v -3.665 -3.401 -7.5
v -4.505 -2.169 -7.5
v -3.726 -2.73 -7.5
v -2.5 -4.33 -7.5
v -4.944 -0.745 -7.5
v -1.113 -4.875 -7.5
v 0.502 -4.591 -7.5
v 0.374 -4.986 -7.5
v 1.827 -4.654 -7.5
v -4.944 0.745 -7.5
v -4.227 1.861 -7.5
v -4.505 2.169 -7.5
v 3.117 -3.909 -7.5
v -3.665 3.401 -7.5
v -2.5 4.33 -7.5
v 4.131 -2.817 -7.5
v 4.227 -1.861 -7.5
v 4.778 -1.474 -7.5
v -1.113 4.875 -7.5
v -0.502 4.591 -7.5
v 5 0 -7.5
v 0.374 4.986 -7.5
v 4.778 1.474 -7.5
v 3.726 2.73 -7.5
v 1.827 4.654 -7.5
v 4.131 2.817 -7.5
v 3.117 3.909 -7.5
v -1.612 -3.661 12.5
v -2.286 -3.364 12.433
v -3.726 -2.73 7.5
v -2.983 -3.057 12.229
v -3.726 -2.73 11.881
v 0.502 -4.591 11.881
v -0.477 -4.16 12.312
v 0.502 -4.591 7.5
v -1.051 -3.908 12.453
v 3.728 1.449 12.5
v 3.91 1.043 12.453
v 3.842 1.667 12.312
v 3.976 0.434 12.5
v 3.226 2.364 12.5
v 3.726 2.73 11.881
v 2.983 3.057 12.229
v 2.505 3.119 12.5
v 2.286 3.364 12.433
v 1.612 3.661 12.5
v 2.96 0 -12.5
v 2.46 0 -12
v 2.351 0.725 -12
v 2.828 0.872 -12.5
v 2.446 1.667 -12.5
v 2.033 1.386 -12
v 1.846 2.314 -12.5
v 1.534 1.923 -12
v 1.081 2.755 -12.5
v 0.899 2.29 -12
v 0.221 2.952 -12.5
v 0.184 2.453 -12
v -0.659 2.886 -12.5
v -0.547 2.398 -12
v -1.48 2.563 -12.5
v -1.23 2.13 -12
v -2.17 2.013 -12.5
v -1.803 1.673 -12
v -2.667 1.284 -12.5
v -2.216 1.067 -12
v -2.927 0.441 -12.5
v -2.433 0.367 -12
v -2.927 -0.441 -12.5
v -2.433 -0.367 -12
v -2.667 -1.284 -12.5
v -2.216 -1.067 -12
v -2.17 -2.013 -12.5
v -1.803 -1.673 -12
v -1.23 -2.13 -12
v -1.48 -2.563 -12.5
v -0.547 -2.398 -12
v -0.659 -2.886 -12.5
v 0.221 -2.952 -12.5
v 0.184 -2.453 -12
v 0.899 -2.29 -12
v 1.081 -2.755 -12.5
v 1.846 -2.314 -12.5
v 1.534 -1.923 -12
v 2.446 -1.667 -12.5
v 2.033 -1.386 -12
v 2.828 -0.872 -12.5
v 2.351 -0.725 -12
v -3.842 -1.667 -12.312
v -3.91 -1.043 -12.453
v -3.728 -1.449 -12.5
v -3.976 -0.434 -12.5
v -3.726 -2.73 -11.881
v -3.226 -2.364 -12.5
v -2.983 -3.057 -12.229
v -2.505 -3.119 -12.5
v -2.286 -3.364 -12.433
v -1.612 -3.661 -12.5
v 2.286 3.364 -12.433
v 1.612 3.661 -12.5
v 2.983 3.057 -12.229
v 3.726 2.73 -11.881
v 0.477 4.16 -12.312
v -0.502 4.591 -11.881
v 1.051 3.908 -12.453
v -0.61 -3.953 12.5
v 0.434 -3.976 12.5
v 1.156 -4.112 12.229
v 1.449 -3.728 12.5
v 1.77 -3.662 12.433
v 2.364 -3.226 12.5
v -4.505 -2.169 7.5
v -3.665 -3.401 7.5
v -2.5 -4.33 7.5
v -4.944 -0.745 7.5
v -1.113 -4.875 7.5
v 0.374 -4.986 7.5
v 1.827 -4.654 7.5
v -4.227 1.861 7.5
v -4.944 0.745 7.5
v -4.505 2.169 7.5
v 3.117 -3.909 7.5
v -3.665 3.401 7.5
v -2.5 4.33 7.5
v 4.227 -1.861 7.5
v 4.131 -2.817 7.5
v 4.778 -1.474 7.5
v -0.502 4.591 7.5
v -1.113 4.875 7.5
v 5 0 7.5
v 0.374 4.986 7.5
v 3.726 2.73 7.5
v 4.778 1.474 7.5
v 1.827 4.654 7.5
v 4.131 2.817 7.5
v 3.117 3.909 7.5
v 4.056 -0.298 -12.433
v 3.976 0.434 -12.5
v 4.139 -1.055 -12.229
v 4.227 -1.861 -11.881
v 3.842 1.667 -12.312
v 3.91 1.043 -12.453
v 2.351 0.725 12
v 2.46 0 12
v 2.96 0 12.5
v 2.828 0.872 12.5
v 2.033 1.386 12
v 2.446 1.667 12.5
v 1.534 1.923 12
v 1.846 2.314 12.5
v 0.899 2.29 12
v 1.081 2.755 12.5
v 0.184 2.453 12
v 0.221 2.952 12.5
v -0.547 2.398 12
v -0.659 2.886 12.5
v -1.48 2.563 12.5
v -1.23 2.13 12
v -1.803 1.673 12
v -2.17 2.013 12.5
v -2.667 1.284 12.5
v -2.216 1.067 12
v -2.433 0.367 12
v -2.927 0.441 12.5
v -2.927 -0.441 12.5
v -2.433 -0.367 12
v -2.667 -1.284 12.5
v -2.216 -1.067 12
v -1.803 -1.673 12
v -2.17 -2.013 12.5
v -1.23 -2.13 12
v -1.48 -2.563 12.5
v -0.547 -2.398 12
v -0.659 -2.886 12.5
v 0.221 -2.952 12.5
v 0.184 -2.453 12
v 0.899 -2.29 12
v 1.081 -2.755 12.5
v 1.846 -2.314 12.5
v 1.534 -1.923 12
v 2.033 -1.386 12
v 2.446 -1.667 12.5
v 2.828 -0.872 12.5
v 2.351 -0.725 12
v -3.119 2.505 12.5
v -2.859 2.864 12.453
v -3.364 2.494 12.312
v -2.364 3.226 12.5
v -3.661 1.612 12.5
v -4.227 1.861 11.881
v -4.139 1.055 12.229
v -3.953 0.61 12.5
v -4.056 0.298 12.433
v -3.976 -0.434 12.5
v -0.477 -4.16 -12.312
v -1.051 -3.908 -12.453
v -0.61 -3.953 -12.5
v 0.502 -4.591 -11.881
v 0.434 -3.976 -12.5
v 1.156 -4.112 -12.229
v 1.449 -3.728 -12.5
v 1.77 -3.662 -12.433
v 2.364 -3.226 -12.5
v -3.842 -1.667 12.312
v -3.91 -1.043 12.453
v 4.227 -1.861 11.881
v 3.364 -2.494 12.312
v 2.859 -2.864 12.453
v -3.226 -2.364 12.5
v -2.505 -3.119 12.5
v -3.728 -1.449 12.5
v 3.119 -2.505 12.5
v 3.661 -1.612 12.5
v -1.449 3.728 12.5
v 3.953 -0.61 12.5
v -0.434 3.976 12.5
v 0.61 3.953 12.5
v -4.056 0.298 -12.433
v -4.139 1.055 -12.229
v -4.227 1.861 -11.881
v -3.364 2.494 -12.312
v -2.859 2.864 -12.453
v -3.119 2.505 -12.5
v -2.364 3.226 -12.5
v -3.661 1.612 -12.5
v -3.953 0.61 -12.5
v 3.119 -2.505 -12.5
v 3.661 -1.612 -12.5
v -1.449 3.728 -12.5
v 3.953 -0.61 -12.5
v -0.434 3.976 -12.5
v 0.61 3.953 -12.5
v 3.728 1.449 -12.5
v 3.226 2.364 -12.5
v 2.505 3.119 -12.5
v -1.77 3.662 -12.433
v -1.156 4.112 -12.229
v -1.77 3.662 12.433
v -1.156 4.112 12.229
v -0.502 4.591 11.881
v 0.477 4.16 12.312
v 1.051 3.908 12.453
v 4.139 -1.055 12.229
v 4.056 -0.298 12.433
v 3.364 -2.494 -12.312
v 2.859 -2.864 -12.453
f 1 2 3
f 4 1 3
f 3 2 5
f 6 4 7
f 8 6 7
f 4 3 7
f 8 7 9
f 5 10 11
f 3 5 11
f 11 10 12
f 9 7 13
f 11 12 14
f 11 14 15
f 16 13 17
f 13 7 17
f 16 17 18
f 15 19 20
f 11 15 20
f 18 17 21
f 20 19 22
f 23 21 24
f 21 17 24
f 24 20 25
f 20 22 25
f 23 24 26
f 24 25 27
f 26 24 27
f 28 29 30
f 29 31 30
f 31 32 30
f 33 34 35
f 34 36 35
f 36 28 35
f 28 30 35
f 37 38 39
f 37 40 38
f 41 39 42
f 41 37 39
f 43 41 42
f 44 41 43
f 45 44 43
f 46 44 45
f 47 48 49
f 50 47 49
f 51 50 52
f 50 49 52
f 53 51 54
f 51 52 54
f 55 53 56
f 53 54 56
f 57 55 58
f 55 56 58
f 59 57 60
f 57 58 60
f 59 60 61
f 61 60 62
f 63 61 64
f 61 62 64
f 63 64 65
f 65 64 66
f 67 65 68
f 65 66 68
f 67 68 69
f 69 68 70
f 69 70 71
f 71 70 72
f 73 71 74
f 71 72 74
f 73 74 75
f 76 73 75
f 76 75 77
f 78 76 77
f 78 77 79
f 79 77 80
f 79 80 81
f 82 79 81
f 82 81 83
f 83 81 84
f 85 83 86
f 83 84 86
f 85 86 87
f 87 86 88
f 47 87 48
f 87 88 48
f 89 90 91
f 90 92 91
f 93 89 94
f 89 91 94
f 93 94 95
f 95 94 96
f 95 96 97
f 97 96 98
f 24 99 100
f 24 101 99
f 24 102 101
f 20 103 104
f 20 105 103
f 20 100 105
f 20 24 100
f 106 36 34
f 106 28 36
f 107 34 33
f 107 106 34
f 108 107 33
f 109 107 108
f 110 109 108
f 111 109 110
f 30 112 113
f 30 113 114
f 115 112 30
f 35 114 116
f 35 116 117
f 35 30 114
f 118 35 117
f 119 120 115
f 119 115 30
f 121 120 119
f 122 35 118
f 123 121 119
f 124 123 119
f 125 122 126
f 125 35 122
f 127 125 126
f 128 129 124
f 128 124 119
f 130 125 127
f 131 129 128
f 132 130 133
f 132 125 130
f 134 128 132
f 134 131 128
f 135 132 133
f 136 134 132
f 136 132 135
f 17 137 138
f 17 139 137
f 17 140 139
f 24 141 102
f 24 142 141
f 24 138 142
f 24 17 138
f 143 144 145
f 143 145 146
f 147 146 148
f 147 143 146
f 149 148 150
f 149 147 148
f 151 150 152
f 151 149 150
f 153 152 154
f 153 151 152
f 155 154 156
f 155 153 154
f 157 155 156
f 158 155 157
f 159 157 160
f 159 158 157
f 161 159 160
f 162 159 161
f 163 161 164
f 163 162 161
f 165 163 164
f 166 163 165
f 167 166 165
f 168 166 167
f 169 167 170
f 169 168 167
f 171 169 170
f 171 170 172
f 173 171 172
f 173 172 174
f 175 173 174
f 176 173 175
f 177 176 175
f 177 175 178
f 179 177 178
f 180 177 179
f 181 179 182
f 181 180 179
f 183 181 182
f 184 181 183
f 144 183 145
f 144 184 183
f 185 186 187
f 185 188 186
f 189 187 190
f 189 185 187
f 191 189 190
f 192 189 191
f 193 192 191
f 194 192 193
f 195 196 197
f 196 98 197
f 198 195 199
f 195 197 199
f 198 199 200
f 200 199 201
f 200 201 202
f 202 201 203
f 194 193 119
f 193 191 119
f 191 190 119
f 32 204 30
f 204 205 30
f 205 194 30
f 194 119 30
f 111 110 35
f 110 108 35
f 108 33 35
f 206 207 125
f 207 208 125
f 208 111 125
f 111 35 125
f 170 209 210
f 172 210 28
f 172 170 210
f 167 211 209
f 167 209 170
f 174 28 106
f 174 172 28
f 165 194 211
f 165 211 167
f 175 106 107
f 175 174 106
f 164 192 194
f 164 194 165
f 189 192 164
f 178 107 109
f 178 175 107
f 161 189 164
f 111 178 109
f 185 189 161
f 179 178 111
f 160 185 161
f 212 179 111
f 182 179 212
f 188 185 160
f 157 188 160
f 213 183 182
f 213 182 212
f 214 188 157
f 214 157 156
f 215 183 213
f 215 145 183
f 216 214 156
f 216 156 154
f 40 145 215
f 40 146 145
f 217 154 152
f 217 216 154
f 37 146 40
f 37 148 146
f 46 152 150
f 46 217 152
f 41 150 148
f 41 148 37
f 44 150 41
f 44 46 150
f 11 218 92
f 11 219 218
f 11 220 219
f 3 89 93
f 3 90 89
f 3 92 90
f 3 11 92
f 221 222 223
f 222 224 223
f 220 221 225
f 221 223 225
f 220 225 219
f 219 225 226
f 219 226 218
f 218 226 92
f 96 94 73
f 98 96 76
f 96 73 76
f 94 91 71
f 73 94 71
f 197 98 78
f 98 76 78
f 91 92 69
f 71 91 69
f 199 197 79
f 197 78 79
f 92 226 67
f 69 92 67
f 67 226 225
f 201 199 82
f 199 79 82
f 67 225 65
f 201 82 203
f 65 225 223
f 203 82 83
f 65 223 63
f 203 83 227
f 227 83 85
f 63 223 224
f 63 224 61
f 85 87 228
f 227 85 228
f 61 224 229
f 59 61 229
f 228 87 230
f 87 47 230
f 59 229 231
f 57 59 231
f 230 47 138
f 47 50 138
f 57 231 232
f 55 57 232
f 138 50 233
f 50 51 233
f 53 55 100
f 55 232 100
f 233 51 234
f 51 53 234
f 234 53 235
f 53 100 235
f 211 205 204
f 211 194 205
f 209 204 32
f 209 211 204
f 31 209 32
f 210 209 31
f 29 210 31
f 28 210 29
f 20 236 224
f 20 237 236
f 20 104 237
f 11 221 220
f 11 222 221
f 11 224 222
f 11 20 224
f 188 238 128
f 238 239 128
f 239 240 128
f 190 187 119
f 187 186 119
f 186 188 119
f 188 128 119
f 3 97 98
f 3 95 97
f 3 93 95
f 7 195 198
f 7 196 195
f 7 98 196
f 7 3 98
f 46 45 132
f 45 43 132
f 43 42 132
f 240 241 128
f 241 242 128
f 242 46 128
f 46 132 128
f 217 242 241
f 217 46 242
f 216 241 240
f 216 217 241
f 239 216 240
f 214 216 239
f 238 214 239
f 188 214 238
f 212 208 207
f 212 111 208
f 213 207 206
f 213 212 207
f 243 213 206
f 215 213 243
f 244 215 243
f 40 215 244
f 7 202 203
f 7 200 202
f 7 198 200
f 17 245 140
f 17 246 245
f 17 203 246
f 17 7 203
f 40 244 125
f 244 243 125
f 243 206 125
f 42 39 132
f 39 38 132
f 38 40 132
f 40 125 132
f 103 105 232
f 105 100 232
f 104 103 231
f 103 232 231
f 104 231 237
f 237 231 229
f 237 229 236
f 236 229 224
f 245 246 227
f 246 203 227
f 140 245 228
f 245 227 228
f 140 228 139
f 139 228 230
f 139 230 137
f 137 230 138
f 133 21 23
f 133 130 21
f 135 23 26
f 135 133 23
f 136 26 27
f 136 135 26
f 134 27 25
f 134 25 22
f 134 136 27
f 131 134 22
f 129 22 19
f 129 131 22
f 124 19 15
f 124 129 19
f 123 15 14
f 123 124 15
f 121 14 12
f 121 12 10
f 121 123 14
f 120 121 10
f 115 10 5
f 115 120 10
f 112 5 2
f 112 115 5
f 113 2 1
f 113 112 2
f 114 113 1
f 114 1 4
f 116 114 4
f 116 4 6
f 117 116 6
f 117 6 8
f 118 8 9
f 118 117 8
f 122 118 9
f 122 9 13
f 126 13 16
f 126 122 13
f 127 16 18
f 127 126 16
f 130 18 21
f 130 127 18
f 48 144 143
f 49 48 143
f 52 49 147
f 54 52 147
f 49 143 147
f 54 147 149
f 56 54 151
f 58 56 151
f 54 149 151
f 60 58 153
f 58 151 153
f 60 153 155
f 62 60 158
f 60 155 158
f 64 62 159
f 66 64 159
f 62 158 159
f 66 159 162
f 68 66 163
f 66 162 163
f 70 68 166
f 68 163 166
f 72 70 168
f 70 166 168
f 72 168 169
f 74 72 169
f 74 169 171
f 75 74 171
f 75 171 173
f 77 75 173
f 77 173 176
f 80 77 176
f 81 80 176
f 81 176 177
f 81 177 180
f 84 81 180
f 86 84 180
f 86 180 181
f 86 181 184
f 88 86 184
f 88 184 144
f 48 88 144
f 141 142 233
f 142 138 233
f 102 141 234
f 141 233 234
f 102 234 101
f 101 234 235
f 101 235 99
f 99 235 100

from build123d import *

# Parameters (mm, degrees)
SKETCH1_R               = 5
BOSS_EXTRUDE1_DEPTH     = 7.5
BOSS_EXTRUDE2_DEPTH     = 5
SKETCH3_R               = 2.46
CUT_EXTRUDE1_DEPTH      = 1
CUT_EXTRUDE1_DEPTH_BACK = 26
CHAMFER1_SIZE           = 0.5


with BuildPart() as part:
    # Sketch1 → Boss-Extrude1 (new body, symmetric)
    with BuildSketch(Plane.XY):
        Circle(SKETCH1_R)
    extrude(amount=BOSS_EXTRUDE1_DEPTH, both=True)

    # Sketch2 → Boss-Extrude2 (add)
    with BuildSketch(Plane.XY.offset(7.5)):
        Polygon((0.50159839, -4.59148477), (4.227141646, -1.861345437), (3.725543257, 2.730139333), (-0.50159839, 4.59148477), (-4.227141646, 1.861345437), (-3.725543257, -2.730139333), align=None)
    boss_extrude2 = extrude(amount=BOSS_EXTRUDE2_DEPTH)

    # Mirror1: Boss-Extrude2 across plane
    add(boss_extrude2.mirror(Plane.XY))

    # Sketch3 → Cut-Extrude1 (cut, two sides)
    with BuildSketch(Plane.XY.offset(12.5)) as cut_extrude1_sk:
        Circle(SKETCH3_R)
    extrude(amount=CUT_EXTRUDE1_DEPTH, mode=Mode.SUBTRACT)
    extrude(cut_extrude1_sk.sketch, amount=-CUT_EXTRUDE1_DEPTH_BACK, mode=Mode.SUBTRACT)

    # Chamfer1
    chamfer1_edges = [part.edges().sort_by_distance(p)[0] for p in [
        (-2.46, 0, 12.5),
        (-2.46, 0, -12.5),
    ]]
    chamfer(chamfer1_edges, length=CHAMFER1_SIZE)

    # Sketch8 → Cut-Revolve3 (revolve, cut)
    with BuildSketch(Plane(origin=(0, 0, 0), x_dir=(-0.915203013, 0.402993108, 0), z_dir=(-0.402993108, -0.915203013, 0))):
        Polygon((4, 12.5), (4.618802154, 12.5), (4.618802154, 11.881197846), align=None)
    cut_revolve3 = revolve(axis=Axis((0, 0, -12), (0, 0, 1)), mode=Mode.SUBTRACT)

    # Mirror2: Cut-Revolve3 across plane
    add(cut_revolve3.mirror(Plane.XY), mode=Mode.SUBTRACT)


solid = part.part
